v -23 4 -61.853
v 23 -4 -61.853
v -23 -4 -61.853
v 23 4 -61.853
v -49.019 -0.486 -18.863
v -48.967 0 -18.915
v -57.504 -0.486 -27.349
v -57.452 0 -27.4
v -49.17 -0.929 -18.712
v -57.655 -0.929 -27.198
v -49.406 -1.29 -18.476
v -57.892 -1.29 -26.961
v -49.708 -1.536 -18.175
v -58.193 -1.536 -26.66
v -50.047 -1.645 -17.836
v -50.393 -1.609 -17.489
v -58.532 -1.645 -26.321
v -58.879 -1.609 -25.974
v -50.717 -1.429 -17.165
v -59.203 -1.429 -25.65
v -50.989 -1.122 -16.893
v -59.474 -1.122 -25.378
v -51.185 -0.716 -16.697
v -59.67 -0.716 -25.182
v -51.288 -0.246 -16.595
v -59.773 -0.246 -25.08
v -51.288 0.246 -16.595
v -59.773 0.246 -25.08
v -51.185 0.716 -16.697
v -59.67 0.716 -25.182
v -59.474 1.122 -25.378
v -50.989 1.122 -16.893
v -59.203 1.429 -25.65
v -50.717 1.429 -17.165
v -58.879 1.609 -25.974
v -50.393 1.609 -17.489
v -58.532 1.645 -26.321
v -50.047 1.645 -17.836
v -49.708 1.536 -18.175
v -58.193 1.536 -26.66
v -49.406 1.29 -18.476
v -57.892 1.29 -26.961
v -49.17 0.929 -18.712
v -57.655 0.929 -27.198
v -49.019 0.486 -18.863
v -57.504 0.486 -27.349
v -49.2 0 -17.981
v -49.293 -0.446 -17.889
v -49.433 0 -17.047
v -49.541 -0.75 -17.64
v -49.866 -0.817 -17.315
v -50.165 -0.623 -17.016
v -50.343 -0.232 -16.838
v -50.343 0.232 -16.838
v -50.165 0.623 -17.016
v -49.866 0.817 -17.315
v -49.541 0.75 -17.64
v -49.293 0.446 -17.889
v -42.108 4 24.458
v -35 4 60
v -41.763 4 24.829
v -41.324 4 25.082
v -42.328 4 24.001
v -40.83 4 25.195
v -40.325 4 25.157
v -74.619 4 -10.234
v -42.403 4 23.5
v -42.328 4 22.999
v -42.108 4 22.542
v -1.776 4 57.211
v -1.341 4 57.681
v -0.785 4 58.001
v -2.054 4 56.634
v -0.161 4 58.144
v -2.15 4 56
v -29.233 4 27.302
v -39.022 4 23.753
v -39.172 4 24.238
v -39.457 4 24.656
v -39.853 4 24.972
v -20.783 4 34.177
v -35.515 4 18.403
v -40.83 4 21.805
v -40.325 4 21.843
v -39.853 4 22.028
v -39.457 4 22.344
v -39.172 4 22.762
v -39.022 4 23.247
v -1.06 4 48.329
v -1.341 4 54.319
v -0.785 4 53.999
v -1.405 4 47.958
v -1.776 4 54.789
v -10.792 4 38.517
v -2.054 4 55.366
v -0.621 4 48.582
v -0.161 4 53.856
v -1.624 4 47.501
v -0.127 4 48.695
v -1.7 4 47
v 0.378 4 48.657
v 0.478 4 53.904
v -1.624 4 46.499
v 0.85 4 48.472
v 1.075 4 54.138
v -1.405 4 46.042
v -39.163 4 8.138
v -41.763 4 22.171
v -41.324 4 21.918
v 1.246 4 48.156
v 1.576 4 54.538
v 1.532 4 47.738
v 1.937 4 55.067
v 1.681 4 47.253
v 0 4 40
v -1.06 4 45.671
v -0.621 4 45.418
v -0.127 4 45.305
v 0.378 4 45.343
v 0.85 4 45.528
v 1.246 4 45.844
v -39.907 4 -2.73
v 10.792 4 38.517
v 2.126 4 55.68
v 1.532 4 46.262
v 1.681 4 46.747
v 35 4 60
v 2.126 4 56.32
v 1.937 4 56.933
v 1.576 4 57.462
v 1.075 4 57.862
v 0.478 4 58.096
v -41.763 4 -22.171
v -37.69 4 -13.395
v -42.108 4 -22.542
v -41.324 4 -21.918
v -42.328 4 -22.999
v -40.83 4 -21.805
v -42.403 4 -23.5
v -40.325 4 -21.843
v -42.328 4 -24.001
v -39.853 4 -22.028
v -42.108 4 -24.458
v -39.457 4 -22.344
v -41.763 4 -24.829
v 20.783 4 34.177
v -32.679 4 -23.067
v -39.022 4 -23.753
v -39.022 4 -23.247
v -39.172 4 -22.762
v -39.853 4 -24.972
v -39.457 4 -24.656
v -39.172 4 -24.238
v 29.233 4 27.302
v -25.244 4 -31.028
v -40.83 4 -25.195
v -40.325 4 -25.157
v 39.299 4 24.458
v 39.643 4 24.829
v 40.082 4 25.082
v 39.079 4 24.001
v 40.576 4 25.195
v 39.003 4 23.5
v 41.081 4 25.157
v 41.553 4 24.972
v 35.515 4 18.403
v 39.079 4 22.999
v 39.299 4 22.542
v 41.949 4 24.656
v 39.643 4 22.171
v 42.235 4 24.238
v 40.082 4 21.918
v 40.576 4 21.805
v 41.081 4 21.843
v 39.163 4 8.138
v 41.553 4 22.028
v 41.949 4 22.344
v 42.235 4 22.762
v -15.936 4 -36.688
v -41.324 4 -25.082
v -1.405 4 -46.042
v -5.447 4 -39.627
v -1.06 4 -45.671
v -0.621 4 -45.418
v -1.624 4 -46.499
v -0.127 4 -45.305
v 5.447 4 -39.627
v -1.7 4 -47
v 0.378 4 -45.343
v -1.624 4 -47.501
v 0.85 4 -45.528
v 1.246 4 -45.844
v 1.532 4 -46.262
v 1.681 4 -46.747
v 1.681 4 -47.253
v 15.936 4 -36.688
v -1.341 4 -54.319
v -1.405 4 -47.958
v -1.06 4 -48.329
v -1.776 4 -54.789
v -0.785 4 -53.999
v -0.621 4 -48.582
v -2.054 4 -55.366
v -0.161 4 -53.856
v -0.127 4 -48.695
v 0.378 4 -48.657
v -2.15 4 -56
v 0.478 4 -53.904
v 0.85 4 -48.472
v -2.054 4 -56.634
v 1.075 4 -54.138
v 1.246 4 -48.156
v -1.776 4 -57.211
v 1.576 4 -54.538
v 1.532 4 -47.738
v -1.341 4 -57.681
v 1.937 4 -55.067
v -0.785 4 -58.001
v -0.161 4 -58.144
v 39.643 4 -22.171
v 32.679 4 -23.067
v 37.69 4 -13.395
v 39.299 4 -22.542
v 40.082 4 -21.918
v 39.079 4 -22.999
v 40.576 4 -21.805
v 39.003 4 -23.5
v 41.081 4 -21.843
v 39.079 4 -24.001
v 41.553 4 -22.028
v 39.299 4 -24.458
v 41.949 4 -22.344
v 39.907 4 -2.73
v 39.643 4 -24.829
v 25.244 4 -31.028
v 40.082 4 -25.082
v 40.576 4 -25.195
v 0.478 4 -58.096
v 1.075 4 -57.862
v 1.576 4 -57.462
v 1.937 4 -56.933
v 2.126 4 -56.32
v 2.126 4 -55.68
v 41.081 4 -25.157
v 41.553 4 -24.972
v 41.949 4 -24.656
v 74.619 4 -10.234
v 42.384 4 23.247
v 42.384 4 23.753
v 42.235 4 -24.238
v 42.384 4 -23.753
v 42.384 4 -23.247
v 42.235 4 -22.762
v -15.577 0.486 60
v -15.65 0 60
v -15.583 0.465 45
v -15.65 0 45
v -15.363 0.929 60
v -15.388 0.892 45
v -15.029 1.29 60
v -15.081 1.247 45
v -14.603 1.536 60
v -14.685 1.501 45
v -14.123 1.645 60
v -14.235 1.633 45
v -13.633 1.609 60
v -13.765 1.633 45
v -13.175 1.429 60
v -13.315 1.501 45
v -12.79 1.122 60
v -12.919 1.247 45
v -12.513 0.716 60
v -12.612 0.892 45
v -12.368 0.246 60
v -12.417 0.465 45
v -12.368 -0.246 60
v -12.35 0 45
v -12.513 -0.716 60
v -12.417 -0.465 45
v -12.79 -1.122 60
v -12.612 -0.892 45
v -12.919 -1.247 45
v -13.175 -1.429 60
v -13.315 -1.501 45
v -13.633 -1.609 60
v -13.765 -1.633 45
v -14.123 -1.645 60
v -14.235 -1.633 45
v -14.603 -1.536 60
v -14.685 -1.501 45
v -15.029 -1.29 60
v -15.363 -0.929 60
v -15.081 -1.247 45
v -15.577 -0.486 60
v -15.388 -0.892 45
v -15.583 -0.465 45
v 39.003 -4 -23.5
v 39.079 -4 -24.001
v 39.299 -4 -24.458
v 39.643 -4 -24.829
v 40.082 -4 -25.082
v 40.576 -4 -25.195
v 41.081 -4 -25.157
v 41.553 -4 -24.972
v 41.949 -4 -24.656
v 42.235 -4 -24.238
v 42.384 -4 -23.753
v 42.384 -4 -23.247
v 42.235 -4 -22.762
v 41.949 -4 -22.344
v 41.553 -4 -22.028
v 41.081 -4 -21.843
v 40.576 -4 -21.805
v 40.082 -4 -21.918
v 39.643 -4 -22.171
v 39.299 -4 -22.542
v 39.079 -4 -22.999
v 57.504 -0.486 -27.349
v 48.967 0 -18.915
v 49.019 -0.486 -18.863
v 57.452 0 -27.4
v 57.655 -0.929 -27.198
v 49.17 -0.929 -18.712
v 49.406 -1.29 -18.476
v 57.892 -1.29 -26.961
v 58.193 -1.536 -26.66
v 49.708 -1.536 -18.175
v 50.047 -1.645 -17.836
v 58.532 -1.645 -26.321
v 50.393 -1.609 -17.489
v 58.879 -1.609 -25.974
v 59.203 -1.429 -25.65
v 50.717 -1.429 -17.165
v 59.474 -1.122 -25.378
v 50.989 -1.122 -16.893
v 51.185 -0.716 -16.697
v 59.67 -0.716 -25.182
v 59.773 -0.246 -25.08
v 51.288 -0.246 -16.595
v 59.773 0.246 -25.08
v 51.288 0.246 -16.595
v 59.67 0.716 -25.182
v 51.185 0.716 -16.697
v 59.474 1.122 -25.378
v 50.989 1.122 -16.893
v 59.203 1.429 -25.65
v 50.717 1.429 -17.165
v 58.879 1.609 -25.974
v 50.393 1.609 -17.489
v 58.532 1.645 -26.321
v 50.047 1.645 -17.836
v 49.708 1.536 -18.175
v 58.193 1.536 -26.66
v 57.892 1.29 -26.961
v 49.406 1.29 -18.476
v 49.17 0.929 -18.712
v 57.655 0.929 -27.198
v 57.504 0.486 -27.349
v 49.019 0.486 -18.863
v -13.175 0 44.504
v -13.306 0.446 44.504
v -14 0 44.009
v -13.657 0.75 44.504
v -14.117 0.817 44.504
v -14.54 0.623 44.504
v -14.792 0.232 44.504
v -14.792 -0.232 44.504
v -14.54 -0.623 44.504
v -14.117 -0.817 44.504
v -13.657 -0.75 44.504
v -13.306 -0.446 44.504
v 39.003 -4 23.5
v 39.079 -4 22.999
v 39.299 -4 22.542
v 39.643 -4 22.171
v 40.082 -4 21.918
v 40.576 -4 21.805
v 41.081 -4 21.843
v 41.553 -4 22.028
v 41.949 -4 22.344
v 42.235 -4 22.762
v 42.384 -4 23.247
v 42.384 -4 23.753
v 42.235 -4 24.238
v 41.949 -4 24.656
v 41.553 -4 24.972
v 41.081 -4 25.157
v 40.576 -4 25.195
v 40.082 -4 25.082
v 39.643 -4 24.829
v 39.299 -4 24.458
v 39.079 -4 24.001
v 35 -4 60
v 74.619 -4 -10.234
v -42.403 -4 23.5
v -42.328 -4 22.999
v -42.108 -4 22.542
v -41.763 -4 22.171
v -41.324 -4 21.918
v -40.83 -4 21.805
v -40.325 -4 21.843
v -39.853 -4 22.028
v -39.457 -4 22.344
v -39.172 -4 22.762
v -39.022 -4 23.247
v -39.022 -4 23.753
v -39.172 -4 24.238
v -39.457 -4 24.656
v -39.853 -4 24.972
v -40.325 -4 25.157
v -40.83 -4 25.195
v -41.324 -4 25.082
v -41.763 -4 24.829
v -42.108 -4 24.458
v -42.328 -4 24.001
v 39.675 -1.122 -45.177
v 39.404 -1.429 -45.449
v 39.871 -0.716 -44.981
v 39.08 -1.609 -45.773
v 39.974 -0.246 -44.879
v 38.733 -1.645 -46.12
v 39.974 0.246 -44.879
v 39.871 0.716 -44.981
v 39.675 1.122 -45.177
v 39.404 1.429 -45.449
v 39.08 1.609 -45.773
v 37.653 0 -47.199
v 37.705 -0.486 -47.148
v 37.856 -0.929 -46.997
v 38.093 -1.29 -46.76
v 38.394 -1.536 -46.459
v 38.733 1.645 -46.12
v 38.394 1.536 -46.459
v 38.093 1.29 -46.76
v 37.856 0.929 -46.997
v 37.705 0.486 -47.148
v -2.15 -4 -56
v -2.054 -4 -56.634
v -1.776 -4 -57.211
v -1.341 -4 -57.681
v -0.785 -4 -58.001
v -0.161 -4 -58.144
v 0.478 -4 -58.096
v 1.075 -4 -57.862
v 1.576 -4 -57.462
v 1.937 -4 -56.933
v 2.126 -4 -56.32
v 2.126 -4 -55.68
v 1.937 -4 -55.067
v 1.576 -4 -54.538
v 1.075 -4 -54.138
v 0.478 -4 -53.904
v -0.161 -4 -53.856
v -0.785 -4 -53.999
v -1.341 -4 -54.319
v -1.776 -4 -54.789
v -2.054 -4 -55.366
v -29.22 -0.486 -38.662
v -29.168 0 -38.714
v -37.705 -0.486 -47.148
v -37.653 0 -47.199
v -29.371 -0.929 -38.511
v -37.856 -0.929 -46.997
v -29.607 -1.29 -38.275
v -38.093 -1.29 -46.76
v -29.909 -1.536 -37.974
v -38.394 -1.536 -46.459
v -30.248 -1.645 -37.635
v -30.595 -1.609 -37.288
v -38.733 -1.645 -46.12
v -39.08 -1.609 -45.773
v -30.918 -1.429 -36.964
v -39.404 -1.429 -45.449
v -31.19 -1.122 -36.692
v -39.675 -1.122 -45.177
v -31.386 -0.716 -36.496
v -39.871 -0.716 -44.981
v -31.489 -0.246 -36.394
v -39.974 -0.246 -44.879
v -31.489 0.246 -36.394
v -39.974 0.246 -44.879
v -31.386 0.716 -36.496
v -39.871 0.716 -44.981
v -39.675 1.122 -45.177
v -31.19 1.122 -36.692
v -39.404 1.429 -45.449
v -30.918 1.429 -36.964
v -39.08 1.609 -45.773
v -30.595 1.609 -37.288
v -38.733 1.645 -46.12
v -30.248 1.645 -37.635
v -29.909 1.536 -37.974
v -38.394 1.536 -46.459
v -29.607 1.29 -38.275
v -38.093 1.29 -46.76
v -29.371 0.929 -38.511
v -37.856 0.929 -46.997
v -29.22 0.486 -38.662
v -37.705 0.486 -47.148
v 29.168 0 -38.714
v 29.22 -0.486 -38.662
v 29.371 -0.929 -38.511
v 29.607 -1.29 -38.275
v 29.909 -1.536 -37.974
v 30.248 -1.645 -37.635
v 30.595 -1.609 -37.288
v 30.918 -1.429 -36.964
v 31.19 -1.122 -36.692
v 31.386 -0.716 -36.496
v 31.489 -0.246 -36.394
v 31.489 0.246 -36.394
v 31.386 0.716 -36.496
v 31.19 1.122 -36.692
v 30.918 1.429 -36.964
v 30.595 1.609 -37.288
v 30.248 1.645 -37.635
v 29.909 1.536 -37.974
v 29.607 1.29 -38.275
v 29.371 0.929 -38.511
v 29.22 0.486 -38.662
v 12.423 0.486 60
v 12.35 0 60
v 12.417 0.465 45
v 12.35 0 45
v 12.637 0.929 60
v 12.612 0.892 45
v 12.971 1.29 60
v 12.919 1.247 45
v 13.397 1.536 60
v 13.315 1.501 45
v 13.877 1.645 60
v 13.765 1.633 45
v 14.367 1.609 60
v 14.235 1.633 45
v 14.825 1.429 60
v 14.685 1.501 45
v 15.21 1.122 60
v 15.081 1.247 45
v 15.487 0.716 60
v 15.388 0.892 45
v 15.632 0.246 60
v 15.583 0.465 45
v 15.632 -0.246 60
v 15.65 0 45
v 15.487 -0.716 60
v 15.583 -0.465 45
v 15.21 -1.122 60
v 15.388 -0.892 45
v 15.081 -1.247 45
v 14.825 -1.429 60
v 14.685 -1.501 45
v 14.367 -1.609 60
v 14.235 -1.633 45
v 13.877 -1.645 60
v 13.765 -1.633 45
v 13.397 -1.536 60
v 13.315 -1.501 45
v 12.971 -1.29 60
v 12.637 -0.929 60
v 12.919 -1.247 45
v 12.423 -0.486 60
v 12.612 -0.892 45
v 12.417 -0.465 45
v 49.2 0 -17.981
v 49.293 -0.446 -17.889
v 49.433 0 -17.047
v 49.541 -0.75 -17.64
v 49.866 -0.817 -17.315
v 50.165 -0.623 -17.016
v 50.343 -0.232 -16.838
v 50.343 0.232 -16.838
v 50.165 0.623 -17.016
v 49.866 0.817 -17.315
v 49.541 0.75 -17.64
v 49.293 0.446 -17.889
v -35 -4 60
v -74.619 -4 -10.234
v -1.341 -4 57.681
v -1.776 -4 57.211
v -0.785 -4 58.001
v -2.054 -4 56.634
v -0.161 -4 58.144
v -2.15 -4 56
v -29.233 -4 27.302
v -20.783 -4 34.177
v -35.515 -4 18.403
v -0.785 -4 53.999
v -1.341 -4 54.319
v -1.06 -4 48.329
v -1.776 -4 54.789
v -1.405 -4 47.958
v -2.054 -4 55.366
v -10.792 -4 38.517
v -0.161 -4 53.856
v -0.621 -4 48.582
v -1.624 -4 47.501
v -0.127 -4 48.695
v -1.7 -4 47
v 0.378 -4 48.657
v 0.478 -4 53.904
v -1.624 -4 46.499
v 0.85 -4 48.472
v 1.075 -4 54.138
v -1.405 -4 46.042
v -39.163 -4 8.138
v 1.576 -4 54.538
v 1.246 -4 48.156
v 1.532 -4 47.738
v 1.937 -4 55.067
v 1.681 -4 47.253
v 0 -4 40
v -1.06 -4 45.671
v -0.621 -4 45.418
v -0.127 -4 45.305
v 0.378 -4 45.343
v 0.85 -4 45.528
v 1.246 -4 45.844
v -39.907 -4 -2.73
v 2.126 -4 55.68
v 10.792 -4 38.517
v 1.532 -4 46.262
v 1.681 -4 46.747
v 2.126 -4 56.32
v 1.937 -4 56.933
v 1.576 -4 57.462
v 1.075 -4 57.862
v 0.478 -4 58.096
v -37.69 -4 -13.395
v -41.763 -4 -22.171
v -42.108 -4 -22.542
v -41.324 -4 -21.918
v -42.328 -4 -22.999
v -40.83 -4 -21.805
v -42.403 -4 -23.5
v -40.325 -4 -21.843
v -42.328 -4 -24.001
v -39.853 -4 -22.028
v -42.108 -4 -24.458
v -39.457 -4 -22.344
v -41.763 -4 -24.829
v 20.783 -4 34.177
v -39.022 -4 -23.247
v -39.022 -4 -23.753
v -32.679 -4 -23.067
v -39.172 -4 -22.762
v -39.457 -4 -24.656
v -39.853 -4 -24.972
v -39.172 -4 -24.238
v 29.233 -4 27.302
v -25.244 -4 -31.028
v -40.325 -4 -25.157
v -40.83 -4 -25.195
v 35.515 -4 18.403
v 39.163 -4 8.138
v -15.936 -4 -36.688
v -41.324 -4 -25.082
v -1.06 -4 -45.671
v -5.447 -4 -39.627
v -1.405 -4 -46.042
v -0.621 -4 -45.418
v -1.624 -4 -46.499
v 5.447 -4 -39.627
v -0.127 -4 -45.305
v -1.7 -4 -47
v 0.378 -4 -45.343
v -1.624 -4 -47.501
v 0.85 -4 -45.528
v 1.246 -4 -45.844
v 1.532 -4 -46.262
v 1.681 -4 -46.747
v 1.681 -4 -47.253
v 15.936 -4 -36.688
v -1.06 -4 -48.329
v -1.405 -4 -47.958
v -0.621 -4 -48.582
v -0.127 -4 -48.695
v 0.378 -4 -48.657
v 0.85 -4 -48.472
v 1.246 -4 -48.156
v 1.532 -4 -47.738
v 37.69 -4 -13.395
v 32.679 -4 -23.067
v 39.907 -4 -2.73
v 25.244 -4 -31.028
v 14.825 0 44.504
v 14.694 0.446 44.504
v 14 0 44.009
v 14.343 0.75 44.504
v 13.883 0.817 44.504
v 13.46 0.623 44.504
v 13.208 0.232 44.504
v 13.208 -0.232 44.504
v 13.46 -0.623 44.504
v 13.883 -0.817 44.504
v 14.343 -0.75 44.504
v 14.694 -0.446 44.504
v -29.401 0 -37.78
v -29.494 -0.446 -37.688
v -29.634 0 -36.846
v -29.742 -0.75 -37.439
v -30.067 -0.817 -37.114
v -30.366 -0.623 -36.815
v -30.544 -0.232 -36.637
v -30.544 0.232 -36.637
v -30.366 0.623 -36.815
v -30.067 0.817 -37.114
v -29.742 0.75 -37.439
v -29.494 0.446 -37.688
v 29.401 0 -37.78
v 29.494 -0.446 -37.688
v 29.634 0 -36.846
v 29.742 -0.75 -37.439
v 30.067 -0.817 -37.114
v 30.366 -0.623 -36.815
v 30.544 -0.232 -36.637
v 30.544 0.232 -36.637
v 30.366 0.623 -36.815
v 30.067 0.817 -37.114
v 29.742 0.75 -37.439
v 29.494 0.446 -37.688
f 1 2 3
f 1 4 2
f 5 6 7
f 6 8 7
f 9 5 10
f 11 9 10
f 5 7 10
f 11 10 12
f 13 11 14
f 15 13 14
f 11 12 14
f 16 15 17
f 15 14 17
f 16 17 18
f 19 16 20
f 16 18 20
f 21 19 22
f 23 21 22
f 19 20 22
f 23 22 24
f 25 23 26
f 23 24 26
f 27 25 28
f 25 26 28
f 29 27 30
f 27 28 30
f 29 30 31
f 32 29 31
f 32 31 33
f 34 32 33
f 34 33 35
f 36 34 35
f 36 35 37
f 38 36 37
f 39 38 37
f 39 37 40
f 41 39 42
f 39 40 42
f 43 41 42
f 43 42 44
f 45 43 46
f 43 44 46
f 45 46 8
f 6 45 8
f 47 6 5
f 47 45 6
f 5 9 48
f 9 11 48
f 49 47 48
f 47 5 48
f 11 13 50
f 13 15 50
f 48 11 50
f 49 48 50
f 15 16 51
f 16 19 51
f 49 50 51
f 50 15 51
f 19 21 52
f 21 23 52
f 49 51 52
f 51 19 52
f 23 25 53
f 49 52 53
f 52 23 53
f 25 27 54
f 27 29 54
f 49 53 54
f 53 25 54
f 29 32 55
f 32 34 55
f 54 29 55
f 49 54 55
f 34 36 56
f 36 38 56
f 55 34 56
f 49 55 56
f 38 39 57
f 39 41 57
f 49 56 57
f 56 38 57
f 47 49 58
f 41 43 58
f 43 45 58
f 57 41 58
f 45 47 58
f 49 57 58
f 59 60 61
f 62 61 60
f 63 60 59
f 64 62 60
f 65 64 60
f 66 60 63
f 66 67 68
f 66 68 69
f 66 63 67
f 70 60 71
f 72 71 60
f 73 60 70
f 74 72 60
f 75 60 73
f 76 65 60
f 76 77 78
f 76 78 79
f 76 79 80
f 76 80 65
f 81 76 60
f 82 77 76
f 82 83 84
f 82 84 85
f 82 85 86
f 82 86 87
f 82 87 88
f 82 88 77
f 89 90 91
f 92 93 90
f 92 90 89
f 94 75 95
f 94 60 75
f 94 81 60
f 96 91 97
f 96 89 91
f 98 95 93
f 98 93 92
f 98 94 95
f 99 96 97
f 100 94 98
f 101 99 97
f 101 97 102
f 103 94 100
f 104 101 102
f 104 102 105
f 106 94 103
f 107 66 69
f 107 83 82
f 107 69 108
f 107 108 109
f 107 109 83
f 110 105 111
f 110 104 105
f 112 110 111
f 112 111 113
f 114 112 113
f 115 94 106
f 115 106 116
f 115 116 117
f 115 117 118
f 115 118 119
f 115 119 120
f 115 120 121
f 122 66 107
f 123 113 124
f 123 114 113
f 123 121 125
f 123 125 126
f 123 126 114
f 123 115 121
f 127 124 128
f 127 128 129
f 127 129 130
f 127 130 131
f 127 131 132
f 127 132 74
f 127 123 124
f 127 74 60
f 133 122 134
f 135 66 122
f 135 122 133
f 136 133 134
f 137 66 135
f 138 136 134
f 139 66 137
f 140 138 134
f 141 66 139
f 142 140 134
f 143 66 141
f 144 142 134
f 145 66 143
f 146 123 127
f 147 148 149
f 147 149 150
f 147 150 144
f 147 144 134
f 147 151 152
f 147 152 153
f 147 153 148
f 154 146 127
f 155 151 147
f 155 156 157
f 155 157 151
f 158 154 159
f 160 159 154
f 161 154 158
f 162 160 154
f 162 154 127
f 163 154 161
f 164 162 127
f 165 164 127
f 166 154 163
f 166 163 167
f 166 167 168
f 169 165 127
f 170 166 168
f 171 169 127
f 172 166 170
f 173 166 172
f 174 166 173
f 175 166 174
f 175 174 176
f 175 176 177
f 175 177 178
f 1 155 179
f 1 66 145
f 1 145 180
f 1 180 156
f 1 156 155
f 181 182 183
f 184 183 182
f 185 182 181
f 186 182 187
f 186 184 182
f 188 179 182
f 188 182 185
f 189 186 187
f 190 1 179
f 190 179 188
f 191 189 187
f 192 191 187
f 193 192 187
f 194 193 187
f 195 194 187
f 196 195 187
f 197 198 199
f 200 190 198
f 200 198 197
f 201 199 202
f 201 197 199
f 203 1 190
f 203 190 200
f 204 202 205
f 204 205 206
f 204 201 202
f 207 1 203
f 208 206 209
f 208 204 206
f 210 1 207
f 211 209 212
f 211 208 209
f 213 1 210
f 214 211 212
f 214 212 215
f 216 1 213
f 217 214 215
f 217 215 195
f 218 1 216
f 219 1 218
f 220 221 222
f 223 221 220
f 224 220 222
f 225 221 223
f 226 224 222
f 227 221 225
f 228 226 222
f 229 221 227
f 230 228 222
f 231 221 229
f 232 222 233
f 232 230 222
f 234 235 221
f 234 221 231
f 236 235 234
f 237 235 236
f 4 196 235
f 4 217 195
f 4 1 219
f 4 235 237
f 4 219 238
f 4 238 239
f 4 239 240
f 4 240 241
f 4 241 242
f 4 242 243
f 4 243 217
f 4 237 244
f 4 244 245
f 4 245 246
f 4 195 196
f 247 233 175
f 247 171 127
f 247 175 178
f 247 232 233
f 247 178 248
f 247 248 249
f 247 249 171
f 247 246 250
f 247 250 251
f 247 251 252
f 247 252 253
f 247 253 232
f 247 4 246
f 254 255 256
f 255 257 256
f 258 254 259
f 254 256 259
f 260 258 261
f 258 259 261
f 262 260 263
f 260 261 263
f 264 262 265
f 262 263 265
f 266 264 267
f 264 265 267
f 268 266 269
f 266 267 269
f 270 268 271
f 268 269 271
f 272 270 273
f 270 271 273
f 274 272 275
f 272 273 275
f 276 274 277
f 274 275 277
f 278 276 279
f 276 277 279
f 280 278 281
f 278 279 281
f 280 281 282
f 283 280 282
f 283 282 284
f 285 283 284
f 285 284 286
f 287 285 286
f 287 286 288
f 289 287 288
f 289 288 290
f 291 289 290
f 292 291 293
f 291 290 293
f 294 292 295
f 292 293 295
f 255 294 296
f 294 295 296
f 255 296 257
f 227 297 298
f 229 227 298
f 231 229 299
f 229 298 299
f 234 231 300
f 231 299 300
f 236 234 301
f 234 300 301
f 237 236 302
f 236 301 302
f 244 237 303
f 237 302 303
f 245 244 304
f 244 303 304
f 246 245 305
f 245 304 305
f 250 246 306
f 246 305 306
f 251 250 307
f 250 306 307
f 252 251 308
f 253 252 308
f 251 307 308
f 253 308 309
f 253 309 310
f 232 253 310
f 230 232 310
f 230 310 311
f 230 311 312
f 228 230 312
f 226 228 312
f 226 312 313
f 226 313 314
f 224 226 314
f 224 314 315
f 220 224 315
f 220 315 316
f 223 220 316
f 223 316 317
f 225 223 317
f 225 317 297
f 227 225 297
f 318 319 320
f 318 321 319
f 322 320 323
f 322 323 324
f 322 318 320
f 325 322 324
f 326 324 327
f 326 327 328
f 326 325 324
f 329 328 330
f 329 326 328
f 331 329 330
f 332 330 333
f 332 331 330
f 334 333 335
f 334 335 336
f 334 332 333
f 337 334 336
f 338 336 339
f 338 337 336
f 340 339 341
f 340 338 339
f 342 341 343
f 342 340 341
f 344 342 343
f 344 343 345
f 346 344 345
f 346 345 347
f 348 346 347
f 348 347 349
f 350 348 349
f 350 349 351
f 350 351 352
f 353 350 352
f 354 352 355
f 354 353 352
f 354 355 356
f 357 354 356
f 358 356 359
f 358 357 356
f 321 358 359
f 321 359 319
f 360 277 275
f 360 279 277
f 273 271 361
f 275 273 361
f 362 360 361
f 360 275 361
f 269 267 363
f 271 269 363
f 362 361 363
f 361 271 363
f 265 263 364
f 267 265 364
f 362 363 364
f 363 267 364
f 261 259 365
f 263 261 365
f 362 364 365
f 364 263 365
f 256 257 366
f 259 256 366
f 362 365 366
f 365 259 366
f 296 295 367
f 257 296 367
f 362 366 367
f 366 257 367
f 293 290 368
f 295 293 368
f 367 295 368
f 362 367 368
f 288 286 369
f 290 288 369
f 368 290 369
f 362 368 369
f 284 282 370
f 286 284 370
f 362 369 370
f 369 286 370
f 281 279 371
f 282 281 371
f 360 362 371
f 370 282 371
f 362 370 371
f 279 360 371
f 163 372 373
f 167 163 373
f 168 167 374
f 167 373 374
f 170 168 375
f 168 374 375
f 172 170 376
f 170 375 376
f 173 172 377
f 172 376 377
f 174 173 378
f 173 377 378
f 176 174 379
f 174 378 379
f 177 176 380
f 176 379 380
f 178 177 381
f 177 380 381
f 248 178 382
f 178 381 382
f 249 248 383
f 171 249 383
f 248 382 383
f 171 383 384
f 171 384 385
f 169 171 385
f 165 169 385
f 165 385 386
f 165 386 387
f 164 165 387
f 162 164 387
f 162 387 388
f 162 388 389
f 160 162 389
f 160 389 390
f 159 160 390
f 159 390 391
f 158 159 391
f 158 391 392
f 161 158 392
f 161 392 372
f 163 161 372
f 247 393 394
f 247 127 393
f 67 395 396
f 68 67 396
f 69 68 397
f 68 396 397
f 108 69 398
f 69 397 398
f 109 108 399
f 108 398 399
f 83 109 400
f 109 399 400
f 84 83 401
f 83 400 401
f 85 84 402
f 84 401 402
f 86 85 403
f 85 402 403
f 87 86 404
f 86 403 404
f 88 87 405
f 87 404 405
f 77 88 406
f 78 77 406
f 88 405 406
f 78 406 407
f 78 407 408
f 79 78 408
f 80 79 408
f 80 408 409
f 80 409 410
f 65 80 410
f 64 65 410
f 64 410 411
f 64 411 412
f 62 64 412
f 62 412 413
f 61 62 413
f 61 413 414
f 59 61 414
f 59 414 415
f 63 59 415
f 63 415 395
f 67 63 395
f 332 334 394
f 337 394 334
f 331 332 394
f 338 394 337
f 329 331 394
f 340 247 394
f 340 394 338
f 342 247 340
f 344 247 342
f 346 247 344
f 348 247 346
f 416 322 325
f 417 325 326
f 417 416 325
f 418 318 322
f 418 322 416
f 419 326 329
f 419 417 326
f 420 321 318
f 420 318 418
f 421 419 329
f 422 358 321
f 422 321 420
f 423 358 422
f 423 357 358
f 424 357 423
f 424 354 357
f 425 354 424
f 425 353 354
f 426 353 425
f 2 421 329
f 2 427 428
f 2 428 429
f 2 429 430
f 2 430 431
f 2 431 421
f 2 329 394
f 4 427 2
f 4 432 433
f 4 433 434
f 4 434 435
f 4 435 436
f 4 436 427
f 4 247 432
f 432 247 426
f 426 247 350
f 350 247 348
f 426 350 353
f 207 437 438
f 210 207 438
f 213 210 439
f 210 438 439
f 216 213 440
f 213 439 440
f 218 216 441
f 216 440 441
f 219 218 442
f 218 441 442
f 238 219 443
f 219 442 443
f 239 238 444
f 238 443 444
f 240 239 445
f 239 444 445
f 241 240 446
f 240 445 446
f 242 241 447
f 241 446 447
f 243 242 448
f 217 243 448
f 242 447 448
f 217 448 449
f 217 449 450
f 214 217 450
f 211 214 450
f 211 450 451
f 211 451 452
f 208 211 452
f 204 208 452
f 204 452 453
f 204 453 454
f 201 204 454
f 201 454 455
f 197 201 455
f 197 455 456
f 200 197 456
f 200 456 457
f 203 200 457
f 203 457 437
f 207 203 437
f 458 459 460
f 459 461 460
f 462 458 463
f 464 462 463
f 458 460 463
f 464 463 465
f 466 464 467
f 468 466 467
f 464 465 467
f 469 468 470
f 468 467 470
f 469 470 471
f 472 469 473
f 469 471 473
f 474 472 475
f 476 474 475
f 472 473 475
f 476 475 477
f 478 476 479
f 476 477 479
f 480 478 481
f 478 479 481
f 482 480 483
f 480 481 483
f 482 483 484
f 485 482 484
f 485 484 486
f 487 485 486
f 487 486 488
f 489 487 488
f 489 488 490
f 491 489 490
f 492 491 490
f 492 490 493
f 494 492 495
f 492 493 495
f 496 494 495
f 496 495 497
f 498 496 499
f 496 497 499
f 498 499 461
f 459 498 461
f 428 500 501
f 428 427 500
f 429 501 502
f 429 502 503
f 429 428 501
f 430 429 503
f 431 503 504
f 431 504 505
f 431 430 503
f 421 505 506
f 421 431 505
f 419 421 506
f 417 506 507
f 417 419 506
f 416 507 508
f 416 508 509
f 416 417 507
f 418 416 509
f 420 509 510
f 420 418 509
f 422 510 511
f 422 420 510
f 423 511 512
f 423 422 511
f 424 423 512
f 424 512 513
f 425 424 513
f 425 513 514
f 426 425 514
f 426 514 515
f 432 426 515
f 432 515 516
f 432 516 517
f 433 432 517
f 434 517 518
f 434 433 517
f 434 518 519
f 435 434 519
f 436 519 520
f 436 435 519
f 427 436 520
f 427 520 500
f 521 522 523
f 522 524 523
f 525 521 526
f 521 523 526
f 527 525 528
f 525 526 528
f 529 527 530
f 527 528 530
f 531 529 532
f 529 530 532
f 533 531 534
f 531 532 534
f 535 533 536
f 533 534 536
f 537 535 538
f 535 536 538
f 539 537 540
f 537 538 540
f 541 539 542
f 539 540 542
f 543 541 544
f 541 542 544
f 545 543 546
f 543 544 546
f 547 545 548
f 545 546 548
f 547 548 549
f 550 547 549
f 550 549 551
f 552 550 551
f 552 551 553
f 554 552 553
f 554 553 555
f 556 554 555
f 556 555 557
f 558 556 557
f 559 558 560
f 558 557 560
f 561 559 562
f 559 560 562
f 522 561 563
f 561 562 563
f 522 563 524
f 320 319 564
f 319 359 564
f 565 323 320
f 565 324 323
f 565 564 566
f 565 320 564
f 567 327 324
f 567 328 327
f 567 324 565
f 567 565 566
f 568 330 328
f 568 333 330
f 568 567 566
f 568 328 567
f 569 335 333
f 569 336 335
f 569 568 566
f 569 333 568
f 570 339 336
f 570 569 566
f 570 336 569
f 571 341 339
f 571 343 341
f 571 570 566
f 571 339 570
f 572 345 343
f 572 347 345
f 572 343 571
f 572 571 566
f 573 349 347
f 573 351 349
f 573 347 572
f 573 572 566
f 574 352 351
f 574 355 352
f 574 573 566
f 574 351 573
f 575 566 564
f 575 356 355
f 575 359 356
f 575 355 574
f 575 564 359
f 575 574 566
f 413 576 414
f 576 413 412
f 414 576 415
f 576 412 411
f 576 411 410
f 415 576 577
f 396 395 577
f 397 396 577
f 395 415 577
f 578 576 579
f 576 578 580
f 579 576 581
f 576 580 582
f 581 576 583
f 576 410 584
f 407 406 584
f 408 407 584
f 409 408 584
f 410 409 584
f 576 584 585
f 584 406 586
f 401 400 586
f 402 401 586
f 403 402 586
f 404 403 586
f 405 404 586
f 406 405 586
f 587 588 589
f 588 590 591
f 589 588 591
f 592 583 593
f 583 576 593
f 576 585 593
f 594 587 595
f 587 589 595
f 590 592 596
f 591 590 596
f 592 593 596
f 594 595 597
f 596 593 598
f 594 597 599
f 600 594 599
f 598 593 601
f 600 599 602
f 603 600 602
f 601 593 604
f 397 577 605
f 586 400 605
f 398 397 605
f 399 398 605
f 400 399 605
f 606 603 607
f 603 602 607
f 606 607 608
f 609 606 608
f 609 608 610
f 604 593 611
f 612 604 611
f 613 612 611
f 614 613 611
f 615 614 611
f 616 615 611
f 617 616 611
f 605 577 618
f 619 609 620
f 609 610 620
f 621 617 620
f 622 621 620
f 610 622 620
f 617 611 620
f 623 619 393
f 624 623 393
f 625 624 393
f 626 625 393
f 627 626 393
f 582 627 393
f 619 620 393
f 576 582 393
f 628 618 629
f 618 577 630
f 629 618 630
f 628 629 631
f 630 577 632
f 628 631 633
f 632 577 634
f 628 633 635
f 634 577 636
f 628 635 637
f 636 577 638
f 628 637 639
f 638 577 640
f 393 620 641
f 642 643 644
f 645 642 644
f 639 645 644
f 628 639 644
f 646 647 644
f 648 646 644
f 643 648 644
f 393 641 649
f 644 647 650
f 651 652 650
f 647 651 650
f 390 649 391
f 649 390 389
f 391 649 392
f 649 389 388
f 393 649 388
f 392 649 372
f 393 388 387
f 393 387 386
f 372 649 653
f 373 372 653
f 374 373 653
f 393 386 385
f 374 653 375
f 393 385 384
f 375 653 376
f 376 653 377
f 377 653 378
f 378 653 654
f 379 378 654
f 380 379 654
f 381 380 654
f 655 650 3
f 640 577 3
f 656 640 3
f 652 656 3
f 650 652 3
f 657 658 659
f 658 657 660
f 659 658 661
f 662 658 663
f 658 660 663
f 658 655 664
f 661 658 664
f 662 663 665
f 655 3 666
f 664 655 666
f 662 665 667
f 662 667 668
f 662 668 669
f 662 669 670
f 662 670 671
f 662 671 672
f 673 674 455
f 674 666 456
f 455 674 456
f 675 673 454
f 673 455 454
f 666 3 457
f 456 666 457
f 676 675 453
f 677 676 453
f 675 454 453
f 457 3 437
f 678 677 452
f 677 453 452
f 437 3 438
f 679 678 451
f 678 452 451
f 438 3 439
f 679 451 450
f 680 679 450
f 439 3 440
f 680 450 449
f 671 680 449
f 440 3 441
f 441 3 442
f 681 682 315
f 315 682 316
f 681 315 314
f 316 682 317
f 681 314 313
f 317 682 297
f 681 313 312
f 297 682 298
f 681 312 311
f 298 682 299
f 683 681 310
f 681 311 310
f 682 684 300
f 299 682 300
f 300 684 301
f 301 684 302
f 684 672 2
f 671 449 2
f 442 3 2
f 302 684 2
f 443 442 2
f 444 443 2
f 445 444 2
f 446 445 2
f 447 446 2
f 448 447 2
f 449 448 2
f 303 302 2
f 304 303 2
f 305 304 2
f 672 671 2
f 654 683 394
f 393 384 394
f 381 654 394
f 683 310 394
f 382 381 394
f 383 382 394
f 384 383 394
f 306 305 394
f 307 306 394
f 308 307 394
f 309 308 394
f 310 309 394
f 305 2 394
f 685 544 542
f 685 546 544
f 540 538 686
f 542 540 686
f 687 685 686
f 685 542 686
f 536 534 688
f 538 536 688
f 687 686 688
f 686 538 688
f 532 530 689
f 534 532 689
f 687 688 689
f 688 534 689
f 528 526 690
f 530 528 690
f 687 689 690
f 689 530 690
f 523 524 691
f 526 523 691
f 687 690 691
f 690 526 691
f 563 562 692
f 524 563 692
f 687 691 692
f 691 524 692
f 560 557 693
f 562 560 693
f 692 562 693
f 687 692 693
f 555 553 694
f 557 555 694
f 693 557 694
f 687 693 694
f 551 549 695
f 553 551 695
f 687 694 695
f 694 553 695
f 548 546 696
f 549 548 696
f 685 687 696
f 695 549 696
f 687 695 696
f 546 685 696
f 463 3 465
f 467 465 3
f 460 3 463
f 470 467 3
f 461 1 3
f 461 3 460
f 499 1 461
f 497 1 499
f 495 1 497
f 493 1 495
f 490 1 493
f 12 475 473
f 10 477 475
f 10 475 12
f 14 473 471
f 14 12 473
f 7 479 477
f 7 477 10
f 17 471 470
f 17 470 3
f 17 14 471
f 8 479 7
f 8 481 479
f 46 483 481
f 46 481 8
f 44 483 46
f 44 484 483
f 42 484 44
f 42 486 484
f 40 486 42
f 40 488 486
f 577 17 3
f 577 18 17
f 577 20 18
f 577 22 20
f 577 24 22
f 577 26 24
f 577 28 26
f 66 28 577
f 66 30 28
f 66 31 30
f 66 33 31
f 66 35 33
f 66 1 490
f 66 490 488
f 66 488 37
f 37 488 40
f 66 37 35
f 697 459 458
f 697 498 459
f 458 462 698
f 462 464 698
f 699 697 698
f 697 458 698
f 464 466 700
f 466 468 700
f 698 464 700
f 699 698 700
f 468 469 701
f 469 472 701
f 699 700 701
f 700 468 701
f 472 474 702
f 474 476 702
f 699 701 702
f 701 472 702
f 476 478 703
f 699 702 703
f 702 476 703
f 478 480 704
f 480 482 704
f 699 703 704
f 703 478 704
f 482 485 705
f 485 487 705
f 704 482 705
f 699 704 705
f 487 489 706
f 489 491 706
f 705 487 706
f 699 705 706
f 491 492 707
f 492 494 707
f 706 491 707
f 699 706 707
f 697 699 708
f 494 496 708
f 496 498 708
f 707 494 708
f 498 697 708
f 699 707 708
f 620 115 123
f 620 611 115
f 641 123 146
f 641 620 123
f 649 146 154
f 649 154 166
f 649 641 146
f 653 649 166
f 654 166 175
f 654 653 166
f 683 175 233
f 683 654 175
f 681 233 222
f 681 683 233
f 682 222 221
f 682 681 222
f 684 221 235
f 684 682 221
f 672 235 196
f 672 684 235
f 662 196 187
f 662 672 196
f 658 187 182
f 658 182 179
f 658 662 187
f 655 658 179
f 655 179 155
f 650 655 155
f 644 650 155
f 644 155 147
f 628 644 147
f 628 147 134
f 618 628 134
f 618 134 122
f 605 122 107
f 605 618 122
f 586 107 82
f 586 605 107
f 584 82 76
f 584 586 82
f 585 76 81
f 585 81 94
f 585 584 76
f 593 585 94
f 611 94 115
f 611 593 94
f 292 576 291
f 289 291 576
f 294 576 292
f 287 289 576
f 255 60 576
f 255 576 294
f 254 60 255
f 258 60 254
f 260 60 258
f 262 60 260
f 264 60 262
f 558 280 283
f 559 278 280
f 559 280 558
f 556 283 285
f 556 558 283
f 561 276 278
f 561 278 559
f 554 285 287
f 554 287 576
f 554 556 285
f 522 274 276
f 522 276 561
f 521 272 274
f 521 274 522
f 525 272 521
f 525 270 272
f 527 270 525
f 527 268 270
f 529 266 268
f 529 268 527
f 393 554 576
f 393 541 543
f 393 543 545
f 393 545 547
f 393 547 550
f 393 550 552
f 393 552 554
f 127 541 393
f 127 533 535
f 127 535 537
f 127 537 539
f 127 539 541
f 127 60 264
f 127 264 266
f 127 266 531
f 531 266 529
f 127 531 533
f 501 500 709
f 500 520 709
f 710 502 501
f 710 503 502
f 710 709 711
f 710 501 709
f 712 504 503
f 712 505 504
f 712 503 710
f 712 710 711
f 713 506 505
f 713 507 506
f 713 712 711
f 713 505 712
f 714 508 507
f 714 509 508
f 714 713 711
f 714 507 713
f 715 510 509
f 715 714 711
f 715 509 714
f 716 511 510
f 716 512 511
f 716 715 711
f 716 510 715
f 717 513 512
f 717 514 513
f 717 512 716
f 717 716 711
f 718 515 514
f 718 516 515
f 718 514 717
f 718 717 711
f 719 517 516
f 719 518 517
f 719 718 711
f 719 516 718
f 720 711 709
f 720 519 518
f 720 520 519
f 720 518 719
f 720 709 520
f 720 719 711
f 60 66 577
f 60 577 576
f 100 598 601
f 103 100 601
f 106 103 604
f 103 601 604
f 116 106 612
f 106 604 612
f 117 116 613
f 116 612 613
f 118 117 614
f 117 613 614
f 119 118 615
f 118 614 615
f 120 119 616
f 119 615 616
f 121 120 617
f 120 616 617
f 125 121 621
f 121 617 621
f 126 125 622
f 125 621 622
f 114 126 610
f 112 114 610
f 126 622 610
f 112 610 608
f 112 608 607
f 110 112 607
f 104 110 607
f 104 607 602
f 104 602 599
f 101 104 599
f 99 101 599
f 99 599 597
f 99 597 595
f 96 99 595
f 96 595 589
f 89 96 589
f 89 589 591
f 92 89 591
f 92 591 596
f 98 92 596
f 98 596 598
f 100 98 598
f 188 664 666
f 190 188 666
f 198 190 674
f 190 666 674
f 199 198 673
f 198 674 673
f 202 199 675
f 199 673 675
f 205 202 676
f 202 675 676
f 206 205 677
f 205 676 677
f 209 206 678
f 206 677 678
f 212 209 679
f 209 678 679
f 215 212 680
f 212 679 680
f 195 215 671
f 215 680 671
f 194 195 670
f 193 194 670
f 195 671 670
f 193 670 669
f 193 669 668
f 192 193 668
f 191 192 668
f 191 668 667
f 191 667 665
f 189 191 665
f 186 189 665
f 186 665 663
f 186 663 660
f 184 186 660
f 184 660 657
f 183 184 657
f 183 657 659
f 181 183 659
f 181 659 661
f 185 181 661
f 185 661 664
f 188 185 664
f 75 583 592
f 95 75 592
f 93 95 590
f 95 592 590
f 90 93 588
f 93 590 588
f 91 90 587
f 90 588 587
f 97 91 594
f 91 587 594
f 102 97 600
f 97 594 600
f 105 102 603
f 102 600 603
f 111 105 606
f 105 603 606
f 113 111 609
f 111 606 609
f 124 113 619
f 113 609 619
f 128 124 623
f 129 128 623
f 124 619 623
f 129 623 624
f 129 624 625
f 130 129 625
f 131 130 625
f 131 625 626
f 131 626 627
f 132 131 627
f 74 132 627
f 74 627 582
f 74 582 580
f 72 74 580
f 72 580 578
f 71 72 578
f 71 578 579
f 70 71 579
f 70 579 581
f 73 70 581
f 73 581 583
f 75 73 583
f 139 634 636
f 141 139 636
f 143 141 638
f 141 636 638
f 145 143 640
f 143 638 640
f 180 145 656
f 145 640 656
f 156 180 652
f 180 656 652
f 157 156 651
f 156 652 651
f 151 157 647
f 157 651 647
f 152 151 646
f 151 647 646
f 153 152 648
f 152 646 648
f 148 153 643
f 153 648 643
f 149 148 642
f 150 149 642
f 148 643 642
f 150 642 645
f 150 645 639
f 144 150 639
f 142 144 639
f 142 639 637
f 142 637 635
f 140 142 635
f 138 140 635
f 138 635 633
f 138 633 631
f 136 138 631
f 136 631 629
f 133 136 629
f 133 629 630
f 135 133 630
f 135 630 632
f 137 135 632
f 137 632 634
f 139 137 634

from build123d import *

# Parameters (mm, degrees)
SKETCH_2_R                  = 40
EXTRUDE_1_DEPTH             = 4
HOLE_WIZARD_M3_1_D          = 3.4
HOLE_WIZARD_M4_1_AT_2_COUNT = 2
HOLE_WIZARD_M4_1_AT_2_PITCH = 28
HOLE_WIZARD_M4_3_D          = 3.3
HOLE_WIZARD_M4_3_DEPTH      = 15
HOLE_WIZARD_M4_3_TIP        = 0.991420021
HOLE_WIZARD_M4_2_D          = 4.3


with BuildPart() as part:
    # 草图2 → 凸台-拉伸1 (new, symmetric)
    with BuildSketch(Plane(origin=(0, 0, 0), x_dir=(1, 0, 0), z_dir=(0, 1, 0))):
        Polygon((23, 61.852813742), (-23, 61.852813742), (-74.618795027, 10.234018716), (-35, -60), (35, -60), (74.618795027, 10.234018716), align=None)
        with Locations(Location((0, 0, 0), (0, 0, 270))):
            Circle(SKETCH_2_R, mode=Mode.SUBTRACT)
    extrude(amount=EXTRUDE_1_DEPTH, both=True)

    # M3 间隙孔1 (through all)
    with Locations(Plane(origin=(0, 4, 0), x_dir=(1, 0, 0), z_dir=(0, 1, 0))):
        with Locations((0, 47), (40.703193978, 23.5), (40.703193978, -23.5), (0, -47), (-40.703193978, -23.5), (-40.703193978, 23.5)):
            Hole(HOLE_WIZARD_M3_1_D / 2)

    # 草图7 → Hole Wizard M4 _1 (revolve, cut)
    with BuildSketch(Plane(origin=(38.820162287, 0, -46.032651455), x_dir=(-0.7071067811865476, 0, -0.7071067811865476), z_dir=(0, 1, 0))):
        Polygon((0, 0), (0, 12.991420021), (1.65, 12), (1.65, 0), align=None)
    hole_wizard_m4_1 = revolve(axis=Axis((43.310290348, 0, -50.522779516), (-0.7071067811865476, 0, 0.7071067811865476)), mode=Mode.SUBTRACT)

    # Hole Wizard M4 _1 at 2: Hole Wizard M4 _1 ×2
    with Locations(*[Vector(0.7071067811865476, 0, 0.7071067811865476) * (i * HOLE_WIZARD_M4_1_AT_2_PITCH) for i in range(1, HOLE_WIZARD_M4_1_AT_2_COUNT)]):
        add(hole_wizard_m4_1, mode=Mode.SUBTRACT)

    # 镜向1: Hole Wizard M4 _1 across plane
    add(hole_wizard_m4_1.mirror(Plane(origin=(0, 0, 0), x_dir=(0, 0, 1), z_dir=(1, 0, 0))), mode=Mode.SUBTRACT)

    # 镜向1 copy 1 sketch → 镜向1 copy 1 (revolve, cut)
    with BuildSketch(Plane(origin=(-58.61915216, 0, -26.233661582), x_dir=(0.7071067811865476, 0, -0.7071067811865476), z_dir=(0, 1, 0))):
        Polygon((0, 0), (0, -12.991420021), (1.65, -12), (1.65, 0), align=None)
    revolve(axis=Axis((-63.109280221, 0, -30.723789643), (-0.7071067811865476, 0, -0.7071067811865476)), mode=Mode.SUBTRACT)

    # M4 螺纹孔3
    with Locations(Plane.XY.offset(60)):
        with Locations((14, 0), (-14, 0)):
            Hole(HOLE_WIZARD_M4_3_D / 2, depth=HOLE_WIZARD_M4_3_DEPTH)
            with Locations((0, 0, -(HOLE_WIZARD_M4_3_DEPTH + HOLE_WIZARD_M4_3_TIP / 2))):  # 118° drill point
                Cone(0, HOLE_WIZARD_M4_3_D / 2, HOLE_WIZARD_M4_3_TIP, mode=Mode.SUBTRACT)

    # M4 间隙孔2 (through all)
    with Locations(Plane(origin=(0, 4, 0), x_dir=(1, 0, 0), z_dir=(0, 1, 0))):
        with Locations((0, 56), (0, -56)):
            Hole(HOLE_WIZARD_M4_2_D / 2)


solid = part.part
